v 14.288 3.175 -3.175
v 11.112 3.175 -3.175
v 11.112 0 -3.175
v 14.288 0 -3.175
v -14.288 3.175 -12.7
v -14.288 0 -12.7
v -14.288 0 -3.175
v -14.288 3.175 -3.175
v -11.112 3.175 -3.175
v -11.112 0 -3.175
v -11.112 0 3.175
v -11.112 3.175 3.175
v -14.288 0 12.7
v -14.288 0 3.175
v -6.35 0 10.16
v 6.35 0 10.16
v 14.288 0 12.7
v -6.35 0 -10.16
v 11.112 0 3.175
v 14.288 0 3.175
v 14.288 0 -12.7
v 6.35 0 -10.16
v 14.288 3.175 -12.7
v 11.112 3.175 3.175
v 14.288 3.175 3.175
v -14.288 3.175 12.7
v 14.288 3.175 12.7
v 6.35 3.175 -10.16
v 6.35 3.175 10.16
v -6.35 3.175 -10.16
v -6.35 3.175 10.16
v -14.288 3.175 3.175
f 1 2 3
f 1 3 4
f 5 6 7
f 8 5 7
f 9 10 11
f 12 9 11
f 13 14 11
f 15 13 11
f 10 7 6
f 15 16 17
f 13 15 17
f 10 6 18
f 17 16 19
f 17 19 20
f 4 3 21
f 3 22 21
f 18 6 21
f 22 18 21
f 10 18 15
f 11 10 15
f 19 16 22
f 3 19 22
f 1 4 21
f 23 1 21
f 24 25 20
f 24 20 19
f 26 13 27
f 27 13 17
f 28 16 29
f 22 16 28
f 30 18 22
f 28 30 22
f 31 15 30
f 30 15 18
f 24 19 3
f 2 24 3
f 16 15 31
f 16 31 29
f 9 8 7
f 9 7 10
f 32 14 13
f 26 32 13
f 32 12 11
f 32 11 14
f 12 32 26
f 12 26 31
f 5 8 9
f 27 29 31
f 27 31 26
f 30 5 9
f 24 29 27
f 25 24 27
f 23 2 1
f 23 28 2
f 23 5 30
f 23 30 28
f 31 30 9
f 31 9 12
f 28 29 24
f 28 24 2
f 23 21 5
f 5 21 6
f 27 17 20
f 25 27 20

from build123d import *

# Parameters (mm, degrees)
SKETCH1_W           = 12.7
SKETCH1_H           = 20.32
BOSS_EXTRUDE1_DEPTH = 3.175


with BuildPart() as part:
    # Sketch1 → Boss-Extrude1 (new body)
    with BuildSketch(Plane(origin=(0, 0, 0), x_dir=(1, 0, 0), z_dir=(0, 1, 0))):
        Polygon((-14.2875, 3.175), (-11.1125, 3.175), (-11.1125, -3.175), (-14.2875, -3.175), (-14.2875, -12.7), (14.2875, -12.7), (14.2875, -3.175), (11.1125, -3.175), (11.1125, 3.175), (14.2875, 3.175), (14.2875, 12.7), (-14.2875, 12.7), align=None)
        Rectangle(SKETCH1_W, SKETCH1_H, mode=Mode.SUBTRACT)
    extrude(amount=BOSS_EXTRUDE1_DEPTH)


solid = part.part
